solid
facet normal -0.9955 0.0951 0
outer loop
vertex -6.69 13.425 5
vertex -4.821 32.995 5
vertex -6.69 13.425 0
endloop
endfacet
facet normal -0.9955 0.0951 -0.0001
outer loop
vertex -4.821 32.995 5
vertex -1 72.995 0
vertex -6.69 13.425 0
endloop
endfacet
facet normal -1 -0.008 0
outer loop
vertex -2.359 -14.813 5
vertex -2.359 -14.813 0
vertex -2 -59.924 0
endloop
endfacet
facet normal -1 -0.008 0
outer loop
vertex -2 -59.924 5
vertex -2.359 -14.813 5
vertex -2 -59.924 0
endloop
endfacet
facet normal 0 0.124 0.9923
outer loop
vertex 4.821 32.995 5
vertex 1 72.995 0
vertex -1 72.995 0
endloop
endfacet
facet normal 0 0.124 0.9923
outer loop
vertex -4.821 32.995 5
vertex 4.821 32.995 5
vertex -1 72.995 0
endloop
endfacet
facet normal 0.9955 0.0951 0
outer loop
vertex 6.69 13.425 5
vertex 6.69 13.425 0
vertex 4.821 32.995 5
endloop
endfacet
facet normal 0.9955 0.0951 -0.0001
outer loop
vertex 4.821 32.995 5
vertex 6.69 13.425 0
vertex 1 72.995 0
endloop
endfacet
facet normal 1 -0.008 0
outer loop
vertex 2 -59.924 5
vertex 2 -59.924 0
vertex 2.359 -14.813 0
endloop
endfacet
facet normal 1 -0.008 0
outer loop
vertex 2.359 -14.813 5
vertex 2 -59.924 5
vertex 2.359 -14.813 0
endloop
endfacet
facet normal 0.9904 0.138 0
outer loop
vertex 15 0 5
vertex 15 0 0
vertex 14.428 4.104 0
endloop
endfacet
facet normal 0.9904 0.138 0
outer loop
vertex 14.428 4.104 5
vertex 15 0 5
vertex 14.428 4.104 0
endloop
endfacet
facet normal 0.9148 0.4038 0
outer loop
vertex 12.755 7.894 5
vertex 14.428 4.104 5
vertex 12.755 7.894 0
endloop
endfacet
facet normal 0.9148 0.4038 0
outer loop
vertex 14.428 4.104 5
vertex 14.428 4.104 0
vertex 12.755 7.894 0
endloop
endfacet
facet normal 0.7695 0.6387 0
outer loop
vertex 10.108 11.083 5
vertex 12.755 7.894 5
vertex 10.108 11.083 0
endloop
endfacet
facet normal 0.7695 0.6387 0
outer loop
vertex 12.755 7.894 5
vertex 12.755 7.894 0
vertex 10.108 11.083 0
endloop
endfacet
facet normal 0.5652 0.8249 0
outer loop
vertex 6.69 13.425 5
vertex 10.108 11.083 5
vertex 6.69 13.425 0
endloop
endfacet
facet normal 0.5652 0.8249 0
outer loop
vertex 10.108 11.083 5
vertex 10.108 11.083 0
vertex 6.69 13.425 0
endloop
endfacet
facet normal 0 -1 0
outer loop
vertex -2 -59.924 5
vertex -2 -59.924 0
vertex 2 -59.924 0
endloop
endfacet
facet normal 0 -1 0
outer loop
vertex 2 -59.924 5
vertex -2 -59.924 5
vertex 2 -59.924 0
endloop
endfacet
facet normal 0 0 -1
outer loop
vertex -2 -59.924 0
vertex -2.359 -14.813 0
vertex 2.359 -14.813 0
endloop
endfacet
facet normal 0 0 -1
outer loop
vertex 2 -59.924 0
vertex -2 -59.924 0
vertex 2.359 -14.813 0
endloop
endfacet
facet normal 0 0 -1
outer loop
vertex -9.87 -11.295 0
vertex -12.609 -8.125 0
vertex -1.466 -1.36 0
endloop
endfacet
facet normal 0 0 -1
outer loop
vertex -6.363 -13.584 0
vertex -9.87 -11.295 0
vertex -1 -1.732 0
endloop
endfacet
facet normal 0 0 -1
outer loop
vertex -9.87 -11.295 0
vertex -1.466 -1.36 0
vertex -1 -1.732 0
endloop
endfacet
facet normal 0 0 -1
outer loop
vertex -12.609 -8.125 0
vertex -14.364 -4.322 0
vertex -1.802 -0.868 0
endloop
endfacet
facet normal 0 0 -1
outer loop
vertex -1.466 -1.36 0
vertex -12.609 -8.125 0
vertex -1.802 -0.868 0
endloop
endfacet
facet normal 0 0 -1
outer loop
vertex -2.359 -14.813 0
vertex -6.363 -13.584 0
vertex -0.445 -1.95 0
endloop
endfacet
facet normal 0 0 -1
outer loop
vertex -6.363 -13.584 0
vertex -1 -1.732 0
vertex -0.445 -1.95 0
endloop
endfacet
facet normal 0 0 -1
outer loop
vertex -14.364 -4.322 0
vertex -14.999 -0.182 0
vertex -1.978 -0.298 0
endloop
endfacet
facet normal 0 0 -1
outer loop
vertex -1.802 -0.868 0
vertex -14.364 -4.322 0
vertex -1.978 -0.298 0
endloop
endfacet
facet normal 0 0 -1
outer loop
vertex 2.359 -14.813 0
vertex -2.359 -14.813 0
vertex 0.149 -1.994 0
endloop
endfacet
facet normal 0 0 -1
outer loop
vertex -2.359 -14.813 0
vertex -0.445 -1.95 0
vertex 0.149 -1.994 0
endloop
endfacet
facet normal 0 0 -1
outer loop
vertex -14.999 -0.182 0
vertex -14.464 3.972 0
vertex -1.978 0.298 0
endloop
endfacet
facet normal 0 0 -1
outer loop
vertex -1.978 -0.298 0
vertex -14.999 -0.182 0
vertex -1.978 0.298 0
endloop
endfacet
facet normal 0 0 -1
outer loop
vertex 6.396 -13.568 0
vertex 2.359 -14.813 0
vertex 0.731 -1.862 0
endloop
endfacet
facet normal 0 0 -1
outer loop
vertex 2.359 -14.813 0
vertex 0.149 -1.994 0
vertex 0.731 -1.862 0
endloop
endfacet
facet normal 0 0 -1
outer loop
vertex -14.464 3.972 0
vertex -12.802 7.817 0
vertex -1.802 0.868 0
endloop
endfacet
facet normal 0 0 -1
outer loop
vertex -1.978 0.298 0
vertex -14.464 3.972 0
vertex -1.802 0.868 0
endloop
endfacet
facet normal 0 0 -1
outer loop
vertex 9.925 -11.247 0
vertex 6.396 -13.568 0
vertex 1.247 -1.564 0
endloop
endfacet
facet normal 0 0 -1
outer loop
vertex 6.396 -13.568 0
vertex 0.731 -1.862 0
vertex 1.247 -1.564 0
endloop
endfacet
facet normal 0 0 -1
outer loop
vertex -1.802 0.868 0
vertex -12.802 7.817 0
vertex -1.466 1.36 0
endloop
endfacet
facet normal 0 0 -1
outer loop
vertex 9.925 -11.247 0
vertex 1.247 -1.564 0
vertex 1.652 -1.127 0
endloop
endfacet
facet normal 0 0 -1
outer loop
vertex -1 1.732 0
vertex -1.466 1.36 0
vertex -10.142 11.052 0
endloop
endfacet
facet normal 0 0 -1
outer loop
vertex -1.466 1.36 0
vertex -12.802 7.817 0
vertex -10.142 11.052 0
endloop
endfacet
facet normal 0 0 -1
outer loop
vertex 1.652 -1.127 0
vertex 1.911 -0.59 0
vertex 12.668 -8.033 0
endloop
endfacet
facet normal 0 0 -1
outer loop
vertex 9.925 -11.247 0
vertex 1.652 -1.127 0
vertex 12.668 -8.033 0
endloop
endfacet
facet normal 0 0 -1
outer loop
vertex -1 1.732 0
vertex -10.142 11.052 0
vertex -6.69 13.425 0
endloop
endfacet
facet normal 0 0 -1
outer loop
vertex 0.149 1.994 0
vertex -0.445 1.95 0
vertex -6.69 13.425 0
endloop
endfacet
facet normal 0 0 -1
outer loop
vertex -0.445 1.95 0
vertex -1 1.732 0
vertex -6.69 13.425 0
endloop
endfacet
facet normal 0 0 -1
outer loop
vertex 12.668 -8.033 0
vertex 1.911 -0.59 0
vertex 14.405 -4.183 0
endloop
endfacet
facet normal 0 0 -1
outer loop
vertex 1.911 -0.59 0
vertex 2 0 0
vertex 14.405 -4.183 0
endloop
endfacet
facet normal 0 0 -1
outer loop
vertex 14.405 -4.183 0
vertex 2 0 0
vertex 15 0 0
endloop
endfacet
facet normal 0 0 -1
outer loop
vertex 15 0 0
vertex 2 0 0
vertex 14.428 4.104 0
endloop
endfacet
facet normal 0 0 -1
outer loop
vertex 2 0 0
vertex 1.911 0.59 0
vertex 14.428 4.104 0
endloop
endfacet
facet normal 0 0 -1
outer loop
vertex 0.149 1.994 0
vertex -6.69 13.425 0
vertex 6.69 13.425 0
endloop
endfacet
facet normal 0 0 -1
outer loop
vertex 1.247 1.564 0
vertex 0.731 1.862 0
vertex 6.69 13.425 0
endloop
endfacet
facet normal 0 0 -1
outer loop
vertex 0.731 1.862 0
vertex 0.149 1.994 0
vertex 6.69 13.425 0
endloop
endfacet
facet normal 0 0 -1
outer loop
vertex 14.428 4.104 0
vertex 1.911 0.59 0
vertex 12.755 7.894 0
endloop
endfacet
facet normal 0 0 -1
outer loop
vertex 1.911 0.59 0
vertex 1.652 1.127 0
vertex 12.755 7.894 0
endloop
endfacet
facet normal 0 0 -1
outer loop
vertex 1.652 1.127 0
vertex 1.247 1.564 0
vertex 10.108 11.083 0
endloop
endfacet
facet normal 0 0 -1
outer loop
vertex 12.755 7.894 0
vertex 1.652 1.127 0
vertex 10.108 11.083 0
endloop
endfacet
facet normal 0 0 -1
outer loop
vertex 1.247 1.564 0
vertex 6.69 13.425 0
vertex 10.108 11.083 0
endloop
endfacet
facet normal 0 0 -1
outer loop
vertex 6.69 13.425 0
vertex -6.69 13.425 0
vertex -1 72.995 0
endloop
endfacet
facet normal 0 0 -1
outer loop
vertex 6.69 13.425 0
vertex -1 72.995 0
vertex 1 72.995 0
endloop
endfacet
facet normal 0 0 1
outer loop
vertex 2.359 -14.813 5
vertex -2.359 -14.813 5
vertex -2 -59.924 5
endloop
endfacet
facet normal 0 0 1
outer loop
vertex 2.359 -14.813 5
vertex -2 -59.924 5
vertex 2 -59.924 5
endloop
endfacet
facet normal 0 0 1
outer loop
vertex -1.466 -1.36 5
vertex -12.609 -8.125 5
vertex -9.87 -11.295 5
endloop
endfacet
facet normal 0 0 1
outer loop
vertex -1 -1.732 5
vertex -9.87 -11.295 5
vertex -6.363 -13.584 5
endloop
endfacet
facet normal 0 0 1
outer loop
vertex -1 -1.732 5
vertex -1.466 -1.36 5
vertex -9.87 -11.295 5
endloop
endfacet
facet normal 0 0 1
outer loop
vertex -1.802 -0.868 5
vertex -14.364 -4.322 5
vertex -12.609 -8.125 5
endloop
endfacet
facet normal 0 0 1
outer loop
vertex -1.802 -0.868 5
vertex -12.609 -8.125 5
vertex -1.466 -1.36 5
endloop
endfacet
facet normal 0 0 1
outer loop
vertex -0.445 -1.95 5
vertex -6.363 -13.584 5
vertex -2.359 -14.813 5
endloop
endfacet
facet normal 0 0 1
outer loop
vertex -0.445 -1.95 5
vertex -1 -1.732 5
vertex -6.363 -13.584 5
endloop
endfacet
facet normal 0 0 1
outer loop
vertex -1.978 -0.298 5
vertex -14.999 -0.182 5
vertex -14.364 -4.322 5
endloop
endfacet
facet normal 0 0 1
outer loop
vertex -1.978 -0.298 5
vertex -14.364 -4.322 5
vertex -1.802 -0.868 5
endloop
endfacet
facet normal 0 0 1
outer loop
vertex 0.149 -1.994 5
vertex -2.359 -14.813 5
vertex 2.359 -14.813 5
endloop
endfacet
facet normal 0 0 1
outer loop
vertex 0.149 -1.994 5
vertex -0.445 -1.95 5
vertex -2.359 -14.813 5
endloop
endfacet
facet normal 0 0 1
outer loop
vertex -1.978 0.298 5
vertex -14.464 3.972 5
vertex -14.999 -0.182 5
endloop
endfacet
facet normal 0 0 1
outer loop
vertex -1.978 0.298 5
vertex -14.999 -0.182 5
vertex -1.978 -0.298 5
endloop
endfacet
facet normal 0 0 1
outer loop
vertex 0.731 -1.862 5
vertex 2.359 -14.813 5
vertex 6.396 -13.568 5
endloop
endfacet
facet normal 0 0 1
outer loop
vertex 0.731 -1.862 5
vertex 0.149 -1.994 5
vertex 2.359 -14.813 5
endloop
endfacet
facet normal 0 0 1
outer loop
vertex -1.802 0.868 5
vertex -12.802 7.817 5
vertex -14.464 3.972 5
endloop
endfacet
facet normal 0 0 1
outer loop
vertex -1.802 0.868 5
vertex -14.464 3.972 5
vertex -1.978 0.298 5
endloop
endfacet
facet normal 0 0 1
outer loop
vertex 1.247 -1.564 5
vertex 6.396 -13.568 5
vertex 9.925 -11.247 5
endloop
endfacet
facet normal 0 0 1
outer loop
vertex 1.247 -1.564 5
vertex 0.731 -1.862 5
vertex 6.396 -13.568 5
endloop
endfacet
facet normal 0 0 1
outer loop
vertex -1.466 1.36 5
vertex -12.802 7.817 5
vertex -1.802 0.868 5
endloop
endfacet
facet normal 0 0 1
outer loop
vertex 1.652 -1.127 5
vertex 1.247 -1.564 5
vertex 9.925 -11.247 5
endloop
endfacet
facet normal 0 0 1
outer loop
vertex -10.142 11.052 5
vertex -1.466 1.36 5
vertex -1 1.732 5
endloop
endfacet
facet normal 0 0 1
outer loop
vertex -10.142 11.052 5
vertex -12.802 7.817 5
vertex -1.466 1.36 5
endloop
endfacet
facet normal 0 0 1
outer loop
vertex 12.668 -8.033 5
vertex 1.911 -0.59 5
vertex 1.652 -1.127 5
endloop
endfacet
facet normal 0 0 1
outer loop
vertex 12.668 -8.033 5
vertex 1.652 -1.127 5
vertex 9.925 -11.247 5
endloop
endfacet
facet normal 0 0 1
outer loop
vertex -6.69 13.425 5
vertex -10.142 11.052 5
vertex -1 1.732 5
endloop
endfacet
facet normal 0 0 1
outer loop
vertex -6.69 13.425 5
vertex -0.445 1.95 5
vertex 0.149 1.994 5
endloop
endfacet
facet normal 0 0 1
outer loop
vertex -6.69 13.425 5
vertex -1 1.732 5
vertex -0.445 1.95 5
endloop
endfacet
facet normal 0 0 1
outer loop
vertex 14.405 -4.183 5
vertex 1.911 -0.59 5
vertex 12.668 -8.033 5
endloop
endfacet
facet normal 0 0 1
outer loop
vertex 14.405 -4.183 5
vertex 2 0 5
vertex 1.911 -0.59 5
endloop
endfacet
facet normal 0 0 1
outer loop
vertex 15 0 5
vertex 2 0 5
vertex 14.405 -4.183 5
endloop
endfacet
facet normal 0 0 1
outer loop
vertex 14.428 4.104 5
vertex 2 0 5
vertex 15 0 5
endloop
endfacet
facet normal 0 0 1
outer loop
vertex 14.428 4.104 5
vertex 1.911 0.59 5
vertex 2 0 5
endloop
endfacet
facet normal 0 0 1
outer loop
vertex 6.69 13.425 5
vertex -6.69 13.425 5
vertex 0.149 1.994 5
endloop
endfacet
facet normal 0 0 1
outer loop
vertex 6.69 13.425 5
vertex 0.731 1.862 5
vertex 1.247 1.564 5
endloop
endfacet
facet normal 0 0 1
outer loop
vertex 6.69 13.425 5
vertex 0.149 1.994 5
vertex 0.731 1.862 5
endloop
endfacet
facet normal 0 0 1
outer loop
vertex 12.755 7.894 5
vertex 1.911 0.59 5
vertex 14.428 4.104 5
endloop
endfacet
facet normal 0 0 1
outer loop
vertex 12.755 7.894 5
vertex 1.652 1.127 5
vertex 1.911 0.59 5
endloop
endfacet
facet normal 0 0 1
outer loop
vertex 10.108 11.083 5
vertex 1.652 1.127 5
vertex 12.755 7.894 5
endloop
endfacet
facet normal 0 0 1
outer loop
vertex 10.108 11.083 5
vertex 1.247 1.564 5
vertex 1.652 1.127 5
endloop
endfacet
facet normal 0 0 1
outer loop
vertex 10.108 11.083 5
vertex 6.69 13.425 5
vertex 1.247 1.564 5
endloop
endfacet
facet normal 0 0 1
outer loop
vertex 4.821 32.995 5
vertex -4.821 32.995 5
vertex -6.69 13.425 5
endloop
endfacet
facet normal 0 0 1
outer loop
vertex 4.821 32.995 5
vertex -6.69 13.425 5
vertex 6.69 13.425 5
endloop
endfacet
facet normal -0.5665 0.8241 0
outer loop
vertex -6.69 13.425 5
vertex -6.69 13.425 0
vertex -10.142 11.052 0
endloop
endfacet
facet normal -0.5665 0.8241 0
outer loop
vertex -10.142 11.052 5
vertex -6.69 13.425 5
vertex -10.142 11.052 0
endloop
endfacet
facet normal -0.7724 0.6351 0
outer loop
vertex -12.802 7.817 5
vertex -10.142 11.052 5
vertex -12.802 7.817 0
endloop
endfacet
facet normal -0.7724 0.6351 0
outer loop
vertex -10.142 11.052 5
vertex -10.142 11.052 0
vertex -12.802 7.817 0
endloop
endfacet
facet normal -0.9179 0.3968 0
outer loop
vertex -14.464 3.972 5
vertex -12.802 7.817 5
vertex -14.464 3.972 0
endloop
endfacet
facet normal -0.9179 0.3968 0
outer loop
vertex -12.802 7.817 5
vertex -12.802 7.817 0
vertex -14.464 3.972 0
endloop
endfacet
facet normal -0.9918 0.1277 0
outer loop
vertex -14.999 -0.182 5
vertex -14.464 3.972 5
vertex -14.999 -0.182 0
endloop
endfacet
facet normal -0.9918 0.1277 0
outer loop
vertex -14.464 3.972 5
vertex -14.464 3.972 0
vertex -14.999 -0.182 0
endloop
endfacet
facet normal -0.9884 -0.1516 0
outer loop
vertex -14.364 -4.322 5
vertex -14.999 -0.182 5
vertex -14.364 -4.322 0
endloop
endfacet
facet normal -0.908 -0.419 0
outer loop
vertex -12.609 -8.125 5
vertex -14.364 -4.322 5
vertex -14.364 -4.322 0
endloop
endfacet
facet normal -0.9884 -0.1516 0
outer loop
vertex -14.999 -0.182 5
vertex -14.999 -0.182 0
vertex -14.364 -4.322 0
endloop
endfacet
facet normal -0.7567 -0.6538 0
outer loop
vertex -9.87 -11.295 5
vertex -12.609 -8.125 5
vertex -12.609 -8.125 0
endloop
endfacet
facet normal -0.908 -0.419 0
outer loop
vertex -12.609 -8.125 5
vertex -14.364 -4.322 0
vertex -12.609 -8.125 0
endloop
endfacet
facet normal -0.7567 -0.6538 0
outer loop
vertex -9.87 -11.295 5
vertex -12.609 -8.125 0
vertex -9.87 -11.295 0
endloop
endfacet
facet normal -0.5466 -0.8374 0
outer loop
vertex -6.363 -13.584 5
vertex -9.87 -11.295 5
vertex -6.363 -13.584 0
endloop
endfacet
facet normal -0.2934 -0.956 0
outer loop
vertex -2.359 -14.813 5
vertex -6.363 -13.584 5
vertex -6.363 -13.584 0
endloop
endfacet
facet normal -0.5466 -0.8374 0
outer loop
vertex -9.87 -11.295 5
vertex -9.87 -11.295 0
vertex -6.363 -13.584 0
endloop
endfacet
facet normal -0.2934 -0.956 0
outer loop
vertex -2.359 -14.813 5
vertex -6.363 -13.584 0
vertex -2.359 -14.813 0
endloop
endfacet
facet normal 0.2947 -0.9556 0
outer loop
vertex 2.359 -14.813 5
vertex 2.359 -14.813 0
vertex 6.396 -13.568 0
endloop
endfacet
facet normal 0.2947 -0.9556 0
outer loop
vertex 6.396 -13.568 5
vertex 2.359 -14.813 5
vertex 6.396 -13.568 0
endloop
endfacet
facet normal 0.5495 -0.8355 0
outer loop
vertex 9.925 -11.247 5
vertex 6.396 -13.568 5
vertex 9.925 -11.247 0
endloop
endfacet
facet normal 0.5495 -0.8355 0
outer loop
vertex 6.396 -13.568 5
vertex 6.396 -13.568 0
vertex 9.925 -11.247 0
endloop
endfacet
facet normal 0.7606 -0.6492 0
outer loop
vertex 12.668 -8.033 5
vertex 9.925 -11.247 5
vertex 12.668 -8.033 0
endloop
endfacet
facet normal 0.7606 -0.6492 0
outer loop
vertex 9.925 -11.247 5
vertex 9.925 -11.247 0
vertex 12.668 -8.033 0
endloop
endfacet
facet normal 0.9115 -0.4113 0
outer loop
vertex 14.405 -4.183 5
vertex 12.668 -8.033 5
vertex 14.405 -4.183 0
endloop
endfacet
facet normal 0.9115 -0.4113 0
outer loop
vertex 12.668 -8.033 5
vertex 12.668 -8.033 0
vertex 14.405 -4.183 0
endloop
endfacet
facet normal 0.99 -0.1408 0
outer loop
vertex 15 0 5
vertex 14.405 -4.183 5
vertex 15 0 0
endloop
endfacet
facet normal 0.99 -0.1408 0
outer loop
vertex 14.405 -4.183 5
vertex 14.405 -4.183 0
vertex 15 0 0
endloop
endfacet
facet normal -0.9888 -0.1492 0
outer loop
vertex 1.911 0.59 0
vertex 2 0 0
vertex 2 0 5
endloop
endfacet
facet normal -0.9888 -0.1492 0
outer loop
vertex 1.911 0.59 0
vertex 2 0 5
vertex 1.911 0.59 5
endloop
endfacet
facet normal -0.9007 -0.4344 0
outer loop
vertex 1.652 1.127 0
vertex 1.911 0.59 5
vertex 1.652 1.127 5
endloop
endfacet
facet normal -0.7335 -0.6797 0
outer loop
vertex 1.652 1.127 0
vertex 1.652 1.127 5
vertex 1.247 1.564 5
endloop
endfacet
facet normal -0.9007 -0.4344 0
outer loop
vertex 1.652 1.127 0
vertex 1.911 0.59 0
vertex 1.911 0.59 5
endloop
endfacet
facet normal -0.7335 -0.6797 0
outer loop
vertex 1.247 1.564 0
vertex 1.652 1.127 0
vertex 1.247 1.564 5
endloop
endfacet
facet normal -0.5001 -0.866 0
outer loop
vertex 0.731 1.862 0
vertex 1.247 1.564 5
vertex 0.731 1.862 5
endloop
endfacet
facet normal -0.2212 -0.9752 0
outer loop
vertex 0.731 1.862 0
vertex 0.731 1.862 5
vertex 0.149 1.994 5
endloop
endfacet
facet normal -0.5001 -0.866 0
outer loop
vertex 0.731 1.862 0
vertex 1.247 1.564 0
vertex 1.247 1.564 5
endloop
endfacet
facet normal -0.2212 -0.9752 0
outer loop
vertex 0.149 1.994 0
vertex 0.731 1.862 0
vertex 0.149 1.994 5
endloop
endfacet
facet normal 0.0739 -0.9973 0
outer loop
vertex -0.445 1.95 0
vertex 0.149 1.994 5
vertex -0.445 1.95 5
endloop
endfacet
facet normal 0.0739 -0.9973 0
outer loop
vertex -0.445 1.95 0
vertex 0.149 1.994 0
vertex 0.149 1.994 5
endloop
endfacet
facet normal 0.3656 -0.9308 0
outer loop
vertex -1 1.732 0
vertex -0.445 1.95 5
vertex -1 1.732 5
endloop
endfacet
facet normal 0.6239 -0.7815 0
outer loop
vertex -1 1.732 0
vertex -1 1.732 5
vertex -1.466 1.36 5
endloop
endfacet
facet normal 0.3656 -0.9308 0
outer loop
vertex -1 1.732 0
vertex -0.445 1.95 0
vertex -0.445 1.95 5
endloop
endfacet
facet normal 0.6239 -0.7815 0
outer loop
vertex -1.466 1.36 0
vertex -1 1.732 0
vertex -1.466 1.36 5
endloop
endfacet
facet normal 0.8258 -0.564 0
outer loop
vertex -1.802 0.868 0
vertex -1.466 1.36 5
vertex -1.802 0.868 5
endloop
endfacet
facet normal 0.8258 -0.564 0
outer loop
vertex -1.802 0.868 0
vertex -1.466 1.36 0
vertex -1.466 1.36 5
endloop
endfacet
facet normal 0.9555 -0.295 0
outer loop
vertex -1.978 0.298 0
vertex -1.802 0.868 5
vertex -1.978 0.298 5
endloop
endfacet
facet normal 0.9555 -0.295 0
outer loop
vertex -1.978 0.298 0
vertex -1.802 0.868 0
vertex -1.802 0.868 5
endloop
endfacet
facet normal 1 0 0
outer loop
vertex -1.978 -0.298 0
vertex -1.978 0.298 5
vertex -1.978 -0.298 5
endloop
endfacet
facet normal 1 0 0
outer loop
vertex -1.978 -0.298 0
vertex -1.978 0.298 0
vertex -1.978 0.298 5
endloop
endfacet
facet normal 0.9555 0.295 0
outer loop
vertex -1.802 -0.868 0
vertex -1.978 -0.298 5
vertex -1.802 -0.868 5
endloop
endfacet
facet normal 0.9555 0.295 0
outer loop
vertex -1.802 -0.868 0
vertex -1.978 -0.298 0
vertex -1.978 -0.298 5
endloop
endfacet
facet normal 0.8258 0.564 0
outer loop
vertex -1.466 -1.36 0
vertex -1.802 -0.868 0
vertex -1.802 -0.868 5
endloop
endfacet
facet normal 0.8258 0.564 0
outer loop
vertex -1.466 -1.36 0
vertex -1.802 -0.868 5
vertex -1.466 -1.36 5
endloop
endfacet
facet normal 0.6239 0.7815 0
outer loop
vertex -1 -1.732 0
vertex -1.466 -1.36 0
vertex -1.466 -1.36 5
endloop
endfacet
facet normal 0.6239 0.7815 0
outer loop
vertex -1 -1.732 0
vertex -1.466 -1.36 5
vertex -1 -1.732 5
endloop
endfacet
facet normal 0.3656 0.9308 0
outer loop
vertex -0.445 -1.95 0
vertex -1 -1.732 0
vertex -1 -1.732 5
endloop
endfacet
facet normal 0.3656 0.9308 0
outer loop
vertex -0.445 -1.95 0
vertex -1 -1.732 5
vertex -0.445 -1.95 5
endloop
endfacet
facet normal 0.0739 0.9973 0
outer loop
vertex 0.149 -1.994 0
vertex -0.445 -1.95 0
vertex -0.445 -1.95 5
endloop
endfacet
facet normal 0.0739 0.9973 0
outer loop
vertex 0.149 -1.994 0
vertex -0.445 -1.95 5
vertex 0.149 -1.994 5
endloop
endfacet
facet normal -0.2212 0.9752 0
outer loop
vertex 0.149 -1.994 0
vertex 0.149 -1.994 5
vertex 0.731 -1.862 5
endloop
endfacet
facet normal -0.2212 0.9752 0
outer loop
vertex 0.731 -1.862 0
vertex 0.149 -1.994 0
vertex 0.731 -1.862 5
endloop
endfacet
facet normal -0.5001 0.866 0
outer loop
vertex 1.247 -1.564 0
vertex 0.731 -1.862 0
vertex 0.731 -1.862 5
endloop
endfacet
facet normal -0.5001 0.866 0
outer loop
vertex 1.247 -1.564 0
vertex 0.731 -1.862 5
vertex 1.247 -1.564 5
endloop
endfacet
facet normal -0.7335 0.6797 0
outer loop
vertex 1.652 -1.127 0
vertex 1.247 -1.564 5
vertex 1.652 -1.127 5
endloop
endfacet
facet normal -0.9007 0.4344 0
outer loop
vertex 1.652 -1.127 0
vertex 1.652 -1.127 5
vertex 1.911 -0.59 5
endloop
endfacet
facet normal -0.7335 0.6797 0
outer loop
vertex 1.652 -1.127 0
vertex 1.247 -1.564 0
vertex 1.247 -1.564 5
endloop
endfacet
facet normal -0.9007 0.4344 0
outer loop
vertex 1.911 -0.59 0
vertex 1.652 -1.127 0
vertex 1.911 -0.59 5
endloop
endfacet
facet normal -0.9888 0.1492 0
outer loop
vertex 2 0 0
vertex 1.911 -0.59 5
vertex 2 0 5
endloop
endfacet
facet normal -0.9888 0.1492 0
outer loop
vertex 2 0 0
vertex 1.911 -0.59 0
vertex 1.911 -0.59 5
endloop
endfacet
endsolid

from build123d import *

# Parameters (mm, degrees)
F0_R     = 2
F1_DEPTH = 5
F2_SIZE2 = 39.99999
F2_SIZE  = 4.99999


# Not quite as in the source:
# - a fillet or chamfer is up to 0.001 mm smaller than in the source, because OpenCascade refuses the exact size


with BuildPart() as f1:
    # F0 (on Top) → F1 (new body)
    with BuildSketch(Plane.XY):
        with BuildLine():
            Line((1, 72.995454073), (0, 72.995454073))
            Line((0, 72.995454073), (-1, 72.995454073))
            Line((-1, 72.995454073), (-6.690328202, 13.4253308544))
            ThreePointArc((-6.690328202, 13.4253308544), (0, 15), (6.690328202, 13.4253308544))
            Line((6.690328202, 13.4253308544), (1, 72.995454073))
        make_face()
        with BuildLine():
            ThreePointArc((15, 0), (12.7545074979, 7.8944625204), (6.690328202, 13.4253308544))
            Line((6.690328202, 13.4253308544), (2.3585444492, -14.813415139))
            ThreePointArc((2.3585444492, -14.813415139), (11.4100430923, -9.7370897413), (15, 0))
        make_face()
        with BuildLine():
            Line((2.3585444492, -14.813415139), (6.690328202, 13.4253308544))
            ThreePointArc((6.690328202, 13.4253308544), (0, 15), (-6.690328202, 13.4253308544))
            Line((-6.690328202, 13.4253308544), (-2.3585444492, -14.813415139))
            ThreePointArc((-2.3585444492, -14.813415139), (0, -15), (2.3585444492, -14.813415139))
        make_face()
        Circle(F0_R, mode=Mode.SUBTRACT)
        with BuildLine():
            Line((-2.3585444492, -14.813415139), (-6.690328202, 13.4253308544))
            ThreePointArc((-6.690328202, 13.4253308544), (-14.8265713462, -2.2743751044), (-2.3585444492, -14.813415139))
        make_face()
        with BuildLine():
            Line((2, -59.9238947034), (2.3585444492, -14.813415139))
            ThreePointArc((2.3585444492, -14.813415139), (0, -15), (-2.3585444492, -14.813415139))
            Line((-2.3585444492, -14.813415139), (-2, -59.9238947034))
            Line((-2, -59.9238947034), (0, -59.9238947034))
            Line((0, -59.9238947034), (2, -59.9238947034))
        make_face()
    extrude(amount=F1_DEPTH)

    # F2 (size 5 and 40 in the source; OpenCascade refuses exactly that, so slightly less here)
    f2_edges = [f1.edges().sort_by_distance(p)[0] for p in [
        (0, 72.995454, 5),
    ]]
    f2_side = f1.faces().sort_by_distance((0, 72.995454, 2.5))[0]
    chamfer(f2_edges, length=F2_SIZE, length2=F2_SIZE2, reference=f2_side)


solid = f1.part
